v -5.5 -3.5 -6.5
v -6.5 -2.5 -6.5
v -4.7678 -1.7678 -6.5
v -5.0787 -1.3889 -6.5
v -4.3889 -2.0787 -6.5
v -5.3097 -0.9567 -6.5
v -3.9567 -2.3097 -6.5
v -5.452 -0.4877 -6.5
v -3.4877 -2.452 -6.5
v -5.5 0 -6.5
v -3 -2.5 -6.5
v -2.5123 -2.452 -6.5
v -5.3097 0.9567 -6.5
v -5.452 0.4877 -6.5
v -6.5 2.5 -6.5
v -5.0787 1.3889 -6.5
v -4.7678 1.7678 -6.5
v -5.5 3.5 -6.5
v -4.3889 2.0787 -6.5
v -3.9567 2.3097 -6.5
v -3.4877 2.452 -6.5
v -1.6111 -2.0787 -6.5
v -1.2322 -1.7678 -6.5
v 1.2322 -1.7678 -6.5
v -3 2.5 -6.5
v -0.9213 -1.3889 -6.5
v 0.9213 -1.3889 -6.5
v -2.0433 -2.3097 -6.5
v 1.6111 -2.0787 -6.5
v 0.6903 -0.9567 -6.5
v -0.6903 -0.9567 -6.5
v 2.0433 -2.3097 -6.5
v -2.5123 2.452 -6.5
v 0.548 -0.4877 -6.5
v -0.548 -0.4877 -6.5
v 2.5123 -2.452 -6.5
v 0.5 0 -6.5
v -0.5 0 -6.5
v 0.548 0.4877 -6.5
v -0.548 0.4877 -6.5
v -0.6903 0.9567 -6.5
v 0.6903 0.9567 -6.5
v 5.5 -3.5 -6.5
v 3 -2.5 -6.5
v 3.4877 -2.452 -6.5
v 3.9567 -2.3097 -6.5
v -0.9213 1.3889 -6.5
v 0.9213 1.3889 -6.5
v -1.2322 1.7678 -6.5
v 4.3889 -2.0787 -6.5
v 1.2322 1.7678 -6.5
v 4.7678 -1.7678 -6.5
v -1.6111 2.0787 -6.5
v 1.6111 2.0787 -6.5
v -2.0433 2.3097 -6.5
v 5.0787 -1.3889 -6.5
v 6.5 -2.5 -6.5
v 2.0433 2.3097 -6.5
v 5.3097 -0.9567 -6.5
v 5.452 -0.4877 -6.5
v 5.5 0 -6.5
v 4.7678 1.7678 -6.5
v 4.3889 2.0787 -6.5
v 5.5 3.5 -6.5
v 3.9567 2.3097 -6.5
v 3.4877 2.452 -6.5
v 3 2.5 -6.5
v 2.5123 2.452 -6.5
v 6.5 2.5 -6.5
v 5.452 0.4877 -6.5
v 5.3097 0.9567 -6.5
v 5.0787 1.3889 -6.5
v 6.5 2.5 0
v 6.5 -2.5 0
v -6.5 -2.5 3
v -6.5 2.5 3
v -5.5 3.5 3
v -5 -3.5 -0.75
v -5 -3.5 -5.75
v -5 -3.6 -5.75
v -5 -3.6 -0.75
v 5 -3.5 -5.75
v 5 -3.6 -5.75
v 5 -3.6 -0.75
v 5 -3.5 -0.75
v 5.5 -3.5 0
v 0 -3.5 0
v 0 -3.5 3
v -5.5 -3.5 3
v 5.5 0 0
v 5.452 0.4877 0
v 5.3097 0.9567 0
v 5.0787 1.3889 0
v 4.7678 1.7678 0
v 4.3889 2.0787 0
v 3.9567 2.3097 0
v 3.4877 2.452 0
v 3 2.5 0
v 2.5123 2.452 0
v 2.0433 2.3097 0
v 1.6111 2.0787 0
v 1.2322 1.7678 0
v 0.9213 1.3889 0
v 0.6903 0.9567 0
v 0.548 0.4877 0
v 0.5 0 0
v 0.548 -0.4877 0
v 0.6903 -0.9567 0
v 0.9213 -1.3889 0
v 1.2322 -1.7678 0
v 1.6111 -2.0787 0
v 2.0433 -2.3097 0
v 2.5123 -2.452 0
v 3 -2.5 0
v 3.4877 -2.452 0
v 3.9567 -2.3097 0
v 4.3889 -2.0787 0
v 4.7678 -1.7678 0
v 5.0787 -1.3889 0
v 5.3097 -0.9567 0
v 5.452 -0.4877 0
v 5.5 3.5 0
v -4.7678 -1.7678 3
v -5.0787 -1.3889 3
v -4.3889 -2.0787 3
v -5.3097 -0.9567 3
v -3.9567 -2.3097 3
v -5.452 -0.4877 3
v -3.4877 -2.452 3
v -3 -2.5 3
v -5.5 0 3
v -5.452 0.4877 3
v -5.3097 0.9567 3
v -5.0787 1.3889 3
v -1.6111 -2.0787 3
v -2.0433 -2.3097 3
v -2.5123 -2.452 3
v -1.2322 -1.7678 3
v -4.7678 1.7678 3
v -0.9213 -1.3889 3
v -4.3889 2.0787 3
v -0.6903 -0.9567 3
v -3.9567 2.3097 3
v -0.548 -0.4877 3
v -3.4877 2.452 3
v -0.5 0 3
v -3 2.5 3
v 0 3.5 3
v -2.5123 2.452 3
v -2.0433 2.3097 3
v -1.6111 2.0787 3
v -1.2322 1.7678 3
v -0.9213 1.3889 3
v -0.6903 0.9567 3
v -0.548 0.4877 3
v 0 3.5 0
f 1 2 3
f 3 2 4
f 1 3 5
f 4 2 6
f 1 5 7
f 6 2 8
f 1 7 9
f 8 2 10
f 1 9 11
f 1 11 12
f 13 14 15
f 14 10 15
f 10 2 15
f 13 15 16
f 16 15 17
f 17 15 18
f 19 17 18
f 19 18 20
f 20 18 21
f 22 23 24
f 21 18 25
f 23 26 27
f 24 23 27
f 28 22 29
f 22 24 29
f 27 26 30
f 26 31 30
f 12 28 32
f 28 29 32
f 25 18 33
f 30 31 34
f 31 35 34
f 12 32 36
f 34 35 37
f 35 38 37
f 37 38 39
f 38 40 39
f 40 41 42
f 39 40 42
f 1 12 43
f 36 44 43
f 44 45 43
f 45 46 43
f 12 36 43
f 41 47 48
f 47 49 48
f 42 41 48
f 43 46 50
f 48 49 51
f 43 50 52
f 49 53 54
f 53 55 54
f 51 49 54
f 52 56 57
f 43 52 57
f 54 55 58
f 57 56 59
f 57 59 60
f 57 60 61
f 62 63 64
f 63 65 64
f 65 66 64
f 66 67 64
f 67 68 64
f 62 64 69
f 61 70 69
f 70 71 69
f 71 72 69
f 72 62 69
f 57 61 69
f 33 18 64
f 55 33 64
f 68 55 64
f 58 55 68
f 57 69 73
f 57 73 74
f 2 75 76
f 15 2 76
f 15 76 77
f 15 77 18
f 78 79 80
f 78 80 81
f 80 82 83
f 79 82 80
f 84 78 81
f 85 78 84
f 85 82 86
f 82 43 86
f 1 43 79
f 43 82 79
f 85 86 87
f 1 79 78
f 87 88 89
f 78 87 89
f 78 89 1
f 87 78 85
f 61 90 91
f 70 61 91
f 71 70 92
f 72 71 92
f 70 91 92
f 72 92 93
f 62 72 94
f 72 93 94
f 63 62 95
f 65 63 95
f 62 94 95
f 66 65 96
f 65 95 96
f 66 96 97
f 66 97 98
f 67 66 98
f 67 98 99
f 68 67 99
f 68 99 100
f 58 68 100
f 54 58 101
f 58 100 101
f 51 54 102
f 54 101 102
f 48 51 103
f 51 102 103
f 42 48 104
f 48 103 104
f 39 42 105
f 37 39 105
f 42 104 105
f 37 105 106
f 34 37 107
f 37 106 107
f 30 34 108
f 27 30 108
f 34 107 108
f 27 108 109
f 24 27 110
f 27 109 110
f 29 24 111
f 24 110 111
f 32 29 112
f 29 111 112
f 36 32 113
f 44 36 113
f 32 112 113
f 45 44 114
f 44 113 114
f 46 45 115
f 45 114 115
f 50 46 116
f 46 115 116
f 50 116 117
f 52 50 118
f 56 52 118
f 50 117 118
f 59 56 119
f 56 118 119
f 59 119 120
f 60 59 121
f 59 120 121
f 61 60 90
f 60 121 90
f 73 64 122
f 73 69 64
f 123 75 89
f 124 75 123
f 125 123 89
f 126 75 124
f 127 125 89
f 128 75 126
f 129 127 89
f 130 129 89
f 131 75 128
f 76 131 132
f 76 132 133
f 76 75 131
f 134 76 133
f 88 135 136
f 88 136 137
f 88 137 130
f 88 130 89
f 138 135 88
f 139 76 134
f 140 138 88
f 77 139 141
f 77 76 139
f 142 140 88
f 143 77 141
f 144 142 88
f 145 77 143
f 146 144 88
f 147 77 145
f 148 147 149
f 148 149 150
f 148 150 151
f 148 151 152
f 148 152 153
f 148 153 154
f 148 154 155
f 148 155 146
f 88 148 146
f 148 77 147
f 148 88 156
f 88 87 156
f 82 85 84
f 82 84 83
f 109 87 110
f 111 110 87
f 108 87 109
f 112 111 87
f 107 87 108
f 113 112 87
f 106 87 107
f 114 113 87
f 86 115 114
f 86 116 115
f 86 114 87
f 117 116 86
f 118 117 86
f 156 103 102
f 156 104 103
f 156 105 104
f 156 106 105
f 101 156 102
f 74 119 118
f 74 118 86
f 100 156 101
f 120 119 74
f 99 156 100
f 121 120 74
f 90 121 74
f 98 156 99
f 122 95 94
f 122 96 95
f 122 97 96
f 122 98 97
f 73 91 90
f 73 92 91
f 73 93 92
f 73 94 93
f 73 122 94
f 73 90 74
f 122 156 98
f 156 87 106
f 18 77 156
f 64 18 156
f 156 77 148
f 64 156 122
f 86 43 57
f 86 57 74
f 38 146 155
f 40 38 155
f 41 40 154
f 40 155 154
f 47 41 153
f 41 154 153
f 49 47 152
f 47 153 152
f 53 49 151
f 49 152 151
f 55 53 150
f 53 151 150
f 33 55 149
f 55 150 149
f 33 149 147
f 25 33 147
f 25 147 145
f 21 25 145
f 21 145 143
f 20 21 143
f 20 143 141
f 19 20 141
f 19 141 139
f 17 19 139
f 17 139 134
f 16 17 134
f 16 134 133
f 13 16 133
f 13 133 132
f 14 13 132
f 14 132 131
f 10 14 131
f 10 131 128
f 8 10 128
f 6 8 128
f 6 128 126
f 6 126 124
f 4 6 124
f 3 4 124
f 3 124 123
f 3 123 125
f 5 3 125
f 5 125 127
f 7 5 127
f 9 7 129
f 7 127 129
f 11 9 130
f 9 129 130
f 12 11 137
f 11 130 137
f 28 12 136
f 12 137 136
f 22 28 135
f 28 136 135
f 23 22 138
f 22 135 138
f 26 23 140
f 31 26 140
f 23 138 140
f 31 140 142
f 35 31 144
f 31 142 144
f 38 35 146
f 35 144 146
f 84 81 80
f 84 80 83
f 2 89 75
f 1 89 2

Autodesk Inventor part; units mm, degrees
ref_plane "YZ Plane" through (0, 0, 0) normal (1, 0, 0) x (0, 1, 0)
ref_plane "XZ Plane" through (0, 0, 0) normal (0, 1, 0) x (-1, 0, 0)
ref_plane "XY Plane" through (0, 0, 0) normal (0, 0, 1) x (1, 0, 0)
sketch "スケッチ1" plane through (0, 0, 0) normal (0, 0, 1) x (1, 0, 0)
  line L0 (-6.5, 3.5) -> (6.5, 3.5)
  line L1 (6.5, 3.5) -> (6.5, -3.5)
  line L2 (6.5, -3.5) -> (-6.5, -3.5)
  line L3 (-6.5, -3.5) -> (-6.5, 3.5)
  line L4 (-6.5, 3.5) -> (6.5, -3.5) construction
  line L5 (6.5, 3.5) -> (-6.5, -3.5) construction
  line L6 (5.5, 3.5) -> (5.5, -3.5)
  line L7 (0.5, 3.5) -> (0.5, -3.5)
  line L8 (-0.5, 3.5) -> (-0.5, -3.5)
  line L9 (-5.5, 3.5) -> (-5.5, -3.5)
  line L10 (0, -4.9) -> (0, 4.9) projected
  circle A0 centre (-3, 0) radius 2.5
  circle A1 centre (3, 0) radius 2.5
  line L11 (-6.5, -2.5) -> (6.5, -2.5)
  line L12 (-6.5, 2.5) -> (6.5, 2.5)
  line L13 (-9.1, 0) -> (9.1, 0) projected
  line L14 (-5.5, 2.5) -> (-0.5, -2.5) construction
  line L15 (-5.5, -2.5) -> (-0.5, 2.5) construction
  line L16 (5.5, 2.5) -> (0.5, -2.5) construction
  line L17 (5.5, -2.5) -> (0.5, 2.5) construction
  point P0 (0, 0)
  point P1 (0, 0)
  point P2 (3, 0)
  point P3 (-3, 0)
  point P4 (0, -3.5)
  point P5 (0, 3.5)
  dimension "d2" = 1
  dimension "d3" = 1
  dimension "d4" = 1
  dimension "d5" = 5
  dimension "d8" = 5
  dimension "d9" = 5
  dimension "d10" = 1
  dimension "d11" = 5
extrude "押し出し1" add sketch "スケッチ1" against normal blind 6.5
extrude "押し出し2" add sketch "スケッチ1" along normal blind 3 contours L0 L9 L12 L3 | L0 L8 L12 L9 | L12 L9 L13 L3 | L0 L10 L12 L8 | L12 A0 L9 | L13 L9 L11 L3 | L12 L10 L13 L8 | L8 A0 L12 | A0 L11 L9 | L13 A0 | A0 L13 | L11 L9 L2 L3 | L13 L10 L11 L8 | L8 L11 A0 | L11 L8 L2 L9 | L11 L10 L2 L8
extrude "押し出し3" cut sketch "スケッチ1" along normal mid plane 20 contours L13 A0 | A0 L13 | L13 A1 | A1 L13
chamfer "面取り1" distance 1 angle 45 4 edges at (-6.5, 3.5, -1.75) (6.5, 3.5, -3.25) (6.5, -3.5, -3.25) (-6.5, -3.5, -1.75)
ref_plane "作業平面1" through (-5.5, -3.5, -6.5) normal (0, -1, 0) x (1, 0, 0)
sketch "スケッチ2" plane through (-5.5, -3.5, -6.5) normal (0, -1, 0) x (1, 0, 0)
  line L0 (0, 0) -> (0, 9.5) projected
  line L1 (11, 0) -> (0, 0) projected
  line L2 (11, 6.5) -> (11, 0) projected
  line L3 (5.5, 6.5) -> (11, 6.5) projected
  line L4 (5.5, 6.5) -> (5.5, 9.5) projected
  line L5 (0, 9.5) -> (5.5, 9.5) projected
  line L6 (0.5, 5.75) -> (10.5, 5.75)
  line L7 (10.5, 5.75) -> (10.5, 0.75)
  line L8 (10.5, 0.75) -> (0.5, 0.75)
  line L9 (0.5, 0.75) -> (0.5, 5.75)
  line L10 (0, 0) -> (0, 9.5) projected
  line L11 (11, 0) -> (12, 0) projected
  line L12 (0, 6.5) -> (11, 0) construction
  line L13 (5, 0) -> (0, 0) projected
  line L14 (12, 6.5) -> (11, 6.5) projected
  line L15 (0, 0) -> (11, 6.5) construction
  line L16 (12, 6.5) -> (-1, 6.5) projected
  line L17 (0.5, 5.75) -> (10.5, 0.75) construction
  line L18 (0.5, 0.75) -> (10.5, 5.75) construction
  point P0 (6.5, 6.5)
  point P1 (5.5, 3.25)
  dimension "d25" = 5
  dimension "d26" = 10
extrude "押し出し4" add sketch "スケッチ2" along normal blind 0.1 contours L6 L7 L8 L9
ref_plane "作業平面2" through (-6.5, -2.5, 3) normal (-1, 0, 0) x (0, 0, 1)
properties part number "sensorholder_3"
